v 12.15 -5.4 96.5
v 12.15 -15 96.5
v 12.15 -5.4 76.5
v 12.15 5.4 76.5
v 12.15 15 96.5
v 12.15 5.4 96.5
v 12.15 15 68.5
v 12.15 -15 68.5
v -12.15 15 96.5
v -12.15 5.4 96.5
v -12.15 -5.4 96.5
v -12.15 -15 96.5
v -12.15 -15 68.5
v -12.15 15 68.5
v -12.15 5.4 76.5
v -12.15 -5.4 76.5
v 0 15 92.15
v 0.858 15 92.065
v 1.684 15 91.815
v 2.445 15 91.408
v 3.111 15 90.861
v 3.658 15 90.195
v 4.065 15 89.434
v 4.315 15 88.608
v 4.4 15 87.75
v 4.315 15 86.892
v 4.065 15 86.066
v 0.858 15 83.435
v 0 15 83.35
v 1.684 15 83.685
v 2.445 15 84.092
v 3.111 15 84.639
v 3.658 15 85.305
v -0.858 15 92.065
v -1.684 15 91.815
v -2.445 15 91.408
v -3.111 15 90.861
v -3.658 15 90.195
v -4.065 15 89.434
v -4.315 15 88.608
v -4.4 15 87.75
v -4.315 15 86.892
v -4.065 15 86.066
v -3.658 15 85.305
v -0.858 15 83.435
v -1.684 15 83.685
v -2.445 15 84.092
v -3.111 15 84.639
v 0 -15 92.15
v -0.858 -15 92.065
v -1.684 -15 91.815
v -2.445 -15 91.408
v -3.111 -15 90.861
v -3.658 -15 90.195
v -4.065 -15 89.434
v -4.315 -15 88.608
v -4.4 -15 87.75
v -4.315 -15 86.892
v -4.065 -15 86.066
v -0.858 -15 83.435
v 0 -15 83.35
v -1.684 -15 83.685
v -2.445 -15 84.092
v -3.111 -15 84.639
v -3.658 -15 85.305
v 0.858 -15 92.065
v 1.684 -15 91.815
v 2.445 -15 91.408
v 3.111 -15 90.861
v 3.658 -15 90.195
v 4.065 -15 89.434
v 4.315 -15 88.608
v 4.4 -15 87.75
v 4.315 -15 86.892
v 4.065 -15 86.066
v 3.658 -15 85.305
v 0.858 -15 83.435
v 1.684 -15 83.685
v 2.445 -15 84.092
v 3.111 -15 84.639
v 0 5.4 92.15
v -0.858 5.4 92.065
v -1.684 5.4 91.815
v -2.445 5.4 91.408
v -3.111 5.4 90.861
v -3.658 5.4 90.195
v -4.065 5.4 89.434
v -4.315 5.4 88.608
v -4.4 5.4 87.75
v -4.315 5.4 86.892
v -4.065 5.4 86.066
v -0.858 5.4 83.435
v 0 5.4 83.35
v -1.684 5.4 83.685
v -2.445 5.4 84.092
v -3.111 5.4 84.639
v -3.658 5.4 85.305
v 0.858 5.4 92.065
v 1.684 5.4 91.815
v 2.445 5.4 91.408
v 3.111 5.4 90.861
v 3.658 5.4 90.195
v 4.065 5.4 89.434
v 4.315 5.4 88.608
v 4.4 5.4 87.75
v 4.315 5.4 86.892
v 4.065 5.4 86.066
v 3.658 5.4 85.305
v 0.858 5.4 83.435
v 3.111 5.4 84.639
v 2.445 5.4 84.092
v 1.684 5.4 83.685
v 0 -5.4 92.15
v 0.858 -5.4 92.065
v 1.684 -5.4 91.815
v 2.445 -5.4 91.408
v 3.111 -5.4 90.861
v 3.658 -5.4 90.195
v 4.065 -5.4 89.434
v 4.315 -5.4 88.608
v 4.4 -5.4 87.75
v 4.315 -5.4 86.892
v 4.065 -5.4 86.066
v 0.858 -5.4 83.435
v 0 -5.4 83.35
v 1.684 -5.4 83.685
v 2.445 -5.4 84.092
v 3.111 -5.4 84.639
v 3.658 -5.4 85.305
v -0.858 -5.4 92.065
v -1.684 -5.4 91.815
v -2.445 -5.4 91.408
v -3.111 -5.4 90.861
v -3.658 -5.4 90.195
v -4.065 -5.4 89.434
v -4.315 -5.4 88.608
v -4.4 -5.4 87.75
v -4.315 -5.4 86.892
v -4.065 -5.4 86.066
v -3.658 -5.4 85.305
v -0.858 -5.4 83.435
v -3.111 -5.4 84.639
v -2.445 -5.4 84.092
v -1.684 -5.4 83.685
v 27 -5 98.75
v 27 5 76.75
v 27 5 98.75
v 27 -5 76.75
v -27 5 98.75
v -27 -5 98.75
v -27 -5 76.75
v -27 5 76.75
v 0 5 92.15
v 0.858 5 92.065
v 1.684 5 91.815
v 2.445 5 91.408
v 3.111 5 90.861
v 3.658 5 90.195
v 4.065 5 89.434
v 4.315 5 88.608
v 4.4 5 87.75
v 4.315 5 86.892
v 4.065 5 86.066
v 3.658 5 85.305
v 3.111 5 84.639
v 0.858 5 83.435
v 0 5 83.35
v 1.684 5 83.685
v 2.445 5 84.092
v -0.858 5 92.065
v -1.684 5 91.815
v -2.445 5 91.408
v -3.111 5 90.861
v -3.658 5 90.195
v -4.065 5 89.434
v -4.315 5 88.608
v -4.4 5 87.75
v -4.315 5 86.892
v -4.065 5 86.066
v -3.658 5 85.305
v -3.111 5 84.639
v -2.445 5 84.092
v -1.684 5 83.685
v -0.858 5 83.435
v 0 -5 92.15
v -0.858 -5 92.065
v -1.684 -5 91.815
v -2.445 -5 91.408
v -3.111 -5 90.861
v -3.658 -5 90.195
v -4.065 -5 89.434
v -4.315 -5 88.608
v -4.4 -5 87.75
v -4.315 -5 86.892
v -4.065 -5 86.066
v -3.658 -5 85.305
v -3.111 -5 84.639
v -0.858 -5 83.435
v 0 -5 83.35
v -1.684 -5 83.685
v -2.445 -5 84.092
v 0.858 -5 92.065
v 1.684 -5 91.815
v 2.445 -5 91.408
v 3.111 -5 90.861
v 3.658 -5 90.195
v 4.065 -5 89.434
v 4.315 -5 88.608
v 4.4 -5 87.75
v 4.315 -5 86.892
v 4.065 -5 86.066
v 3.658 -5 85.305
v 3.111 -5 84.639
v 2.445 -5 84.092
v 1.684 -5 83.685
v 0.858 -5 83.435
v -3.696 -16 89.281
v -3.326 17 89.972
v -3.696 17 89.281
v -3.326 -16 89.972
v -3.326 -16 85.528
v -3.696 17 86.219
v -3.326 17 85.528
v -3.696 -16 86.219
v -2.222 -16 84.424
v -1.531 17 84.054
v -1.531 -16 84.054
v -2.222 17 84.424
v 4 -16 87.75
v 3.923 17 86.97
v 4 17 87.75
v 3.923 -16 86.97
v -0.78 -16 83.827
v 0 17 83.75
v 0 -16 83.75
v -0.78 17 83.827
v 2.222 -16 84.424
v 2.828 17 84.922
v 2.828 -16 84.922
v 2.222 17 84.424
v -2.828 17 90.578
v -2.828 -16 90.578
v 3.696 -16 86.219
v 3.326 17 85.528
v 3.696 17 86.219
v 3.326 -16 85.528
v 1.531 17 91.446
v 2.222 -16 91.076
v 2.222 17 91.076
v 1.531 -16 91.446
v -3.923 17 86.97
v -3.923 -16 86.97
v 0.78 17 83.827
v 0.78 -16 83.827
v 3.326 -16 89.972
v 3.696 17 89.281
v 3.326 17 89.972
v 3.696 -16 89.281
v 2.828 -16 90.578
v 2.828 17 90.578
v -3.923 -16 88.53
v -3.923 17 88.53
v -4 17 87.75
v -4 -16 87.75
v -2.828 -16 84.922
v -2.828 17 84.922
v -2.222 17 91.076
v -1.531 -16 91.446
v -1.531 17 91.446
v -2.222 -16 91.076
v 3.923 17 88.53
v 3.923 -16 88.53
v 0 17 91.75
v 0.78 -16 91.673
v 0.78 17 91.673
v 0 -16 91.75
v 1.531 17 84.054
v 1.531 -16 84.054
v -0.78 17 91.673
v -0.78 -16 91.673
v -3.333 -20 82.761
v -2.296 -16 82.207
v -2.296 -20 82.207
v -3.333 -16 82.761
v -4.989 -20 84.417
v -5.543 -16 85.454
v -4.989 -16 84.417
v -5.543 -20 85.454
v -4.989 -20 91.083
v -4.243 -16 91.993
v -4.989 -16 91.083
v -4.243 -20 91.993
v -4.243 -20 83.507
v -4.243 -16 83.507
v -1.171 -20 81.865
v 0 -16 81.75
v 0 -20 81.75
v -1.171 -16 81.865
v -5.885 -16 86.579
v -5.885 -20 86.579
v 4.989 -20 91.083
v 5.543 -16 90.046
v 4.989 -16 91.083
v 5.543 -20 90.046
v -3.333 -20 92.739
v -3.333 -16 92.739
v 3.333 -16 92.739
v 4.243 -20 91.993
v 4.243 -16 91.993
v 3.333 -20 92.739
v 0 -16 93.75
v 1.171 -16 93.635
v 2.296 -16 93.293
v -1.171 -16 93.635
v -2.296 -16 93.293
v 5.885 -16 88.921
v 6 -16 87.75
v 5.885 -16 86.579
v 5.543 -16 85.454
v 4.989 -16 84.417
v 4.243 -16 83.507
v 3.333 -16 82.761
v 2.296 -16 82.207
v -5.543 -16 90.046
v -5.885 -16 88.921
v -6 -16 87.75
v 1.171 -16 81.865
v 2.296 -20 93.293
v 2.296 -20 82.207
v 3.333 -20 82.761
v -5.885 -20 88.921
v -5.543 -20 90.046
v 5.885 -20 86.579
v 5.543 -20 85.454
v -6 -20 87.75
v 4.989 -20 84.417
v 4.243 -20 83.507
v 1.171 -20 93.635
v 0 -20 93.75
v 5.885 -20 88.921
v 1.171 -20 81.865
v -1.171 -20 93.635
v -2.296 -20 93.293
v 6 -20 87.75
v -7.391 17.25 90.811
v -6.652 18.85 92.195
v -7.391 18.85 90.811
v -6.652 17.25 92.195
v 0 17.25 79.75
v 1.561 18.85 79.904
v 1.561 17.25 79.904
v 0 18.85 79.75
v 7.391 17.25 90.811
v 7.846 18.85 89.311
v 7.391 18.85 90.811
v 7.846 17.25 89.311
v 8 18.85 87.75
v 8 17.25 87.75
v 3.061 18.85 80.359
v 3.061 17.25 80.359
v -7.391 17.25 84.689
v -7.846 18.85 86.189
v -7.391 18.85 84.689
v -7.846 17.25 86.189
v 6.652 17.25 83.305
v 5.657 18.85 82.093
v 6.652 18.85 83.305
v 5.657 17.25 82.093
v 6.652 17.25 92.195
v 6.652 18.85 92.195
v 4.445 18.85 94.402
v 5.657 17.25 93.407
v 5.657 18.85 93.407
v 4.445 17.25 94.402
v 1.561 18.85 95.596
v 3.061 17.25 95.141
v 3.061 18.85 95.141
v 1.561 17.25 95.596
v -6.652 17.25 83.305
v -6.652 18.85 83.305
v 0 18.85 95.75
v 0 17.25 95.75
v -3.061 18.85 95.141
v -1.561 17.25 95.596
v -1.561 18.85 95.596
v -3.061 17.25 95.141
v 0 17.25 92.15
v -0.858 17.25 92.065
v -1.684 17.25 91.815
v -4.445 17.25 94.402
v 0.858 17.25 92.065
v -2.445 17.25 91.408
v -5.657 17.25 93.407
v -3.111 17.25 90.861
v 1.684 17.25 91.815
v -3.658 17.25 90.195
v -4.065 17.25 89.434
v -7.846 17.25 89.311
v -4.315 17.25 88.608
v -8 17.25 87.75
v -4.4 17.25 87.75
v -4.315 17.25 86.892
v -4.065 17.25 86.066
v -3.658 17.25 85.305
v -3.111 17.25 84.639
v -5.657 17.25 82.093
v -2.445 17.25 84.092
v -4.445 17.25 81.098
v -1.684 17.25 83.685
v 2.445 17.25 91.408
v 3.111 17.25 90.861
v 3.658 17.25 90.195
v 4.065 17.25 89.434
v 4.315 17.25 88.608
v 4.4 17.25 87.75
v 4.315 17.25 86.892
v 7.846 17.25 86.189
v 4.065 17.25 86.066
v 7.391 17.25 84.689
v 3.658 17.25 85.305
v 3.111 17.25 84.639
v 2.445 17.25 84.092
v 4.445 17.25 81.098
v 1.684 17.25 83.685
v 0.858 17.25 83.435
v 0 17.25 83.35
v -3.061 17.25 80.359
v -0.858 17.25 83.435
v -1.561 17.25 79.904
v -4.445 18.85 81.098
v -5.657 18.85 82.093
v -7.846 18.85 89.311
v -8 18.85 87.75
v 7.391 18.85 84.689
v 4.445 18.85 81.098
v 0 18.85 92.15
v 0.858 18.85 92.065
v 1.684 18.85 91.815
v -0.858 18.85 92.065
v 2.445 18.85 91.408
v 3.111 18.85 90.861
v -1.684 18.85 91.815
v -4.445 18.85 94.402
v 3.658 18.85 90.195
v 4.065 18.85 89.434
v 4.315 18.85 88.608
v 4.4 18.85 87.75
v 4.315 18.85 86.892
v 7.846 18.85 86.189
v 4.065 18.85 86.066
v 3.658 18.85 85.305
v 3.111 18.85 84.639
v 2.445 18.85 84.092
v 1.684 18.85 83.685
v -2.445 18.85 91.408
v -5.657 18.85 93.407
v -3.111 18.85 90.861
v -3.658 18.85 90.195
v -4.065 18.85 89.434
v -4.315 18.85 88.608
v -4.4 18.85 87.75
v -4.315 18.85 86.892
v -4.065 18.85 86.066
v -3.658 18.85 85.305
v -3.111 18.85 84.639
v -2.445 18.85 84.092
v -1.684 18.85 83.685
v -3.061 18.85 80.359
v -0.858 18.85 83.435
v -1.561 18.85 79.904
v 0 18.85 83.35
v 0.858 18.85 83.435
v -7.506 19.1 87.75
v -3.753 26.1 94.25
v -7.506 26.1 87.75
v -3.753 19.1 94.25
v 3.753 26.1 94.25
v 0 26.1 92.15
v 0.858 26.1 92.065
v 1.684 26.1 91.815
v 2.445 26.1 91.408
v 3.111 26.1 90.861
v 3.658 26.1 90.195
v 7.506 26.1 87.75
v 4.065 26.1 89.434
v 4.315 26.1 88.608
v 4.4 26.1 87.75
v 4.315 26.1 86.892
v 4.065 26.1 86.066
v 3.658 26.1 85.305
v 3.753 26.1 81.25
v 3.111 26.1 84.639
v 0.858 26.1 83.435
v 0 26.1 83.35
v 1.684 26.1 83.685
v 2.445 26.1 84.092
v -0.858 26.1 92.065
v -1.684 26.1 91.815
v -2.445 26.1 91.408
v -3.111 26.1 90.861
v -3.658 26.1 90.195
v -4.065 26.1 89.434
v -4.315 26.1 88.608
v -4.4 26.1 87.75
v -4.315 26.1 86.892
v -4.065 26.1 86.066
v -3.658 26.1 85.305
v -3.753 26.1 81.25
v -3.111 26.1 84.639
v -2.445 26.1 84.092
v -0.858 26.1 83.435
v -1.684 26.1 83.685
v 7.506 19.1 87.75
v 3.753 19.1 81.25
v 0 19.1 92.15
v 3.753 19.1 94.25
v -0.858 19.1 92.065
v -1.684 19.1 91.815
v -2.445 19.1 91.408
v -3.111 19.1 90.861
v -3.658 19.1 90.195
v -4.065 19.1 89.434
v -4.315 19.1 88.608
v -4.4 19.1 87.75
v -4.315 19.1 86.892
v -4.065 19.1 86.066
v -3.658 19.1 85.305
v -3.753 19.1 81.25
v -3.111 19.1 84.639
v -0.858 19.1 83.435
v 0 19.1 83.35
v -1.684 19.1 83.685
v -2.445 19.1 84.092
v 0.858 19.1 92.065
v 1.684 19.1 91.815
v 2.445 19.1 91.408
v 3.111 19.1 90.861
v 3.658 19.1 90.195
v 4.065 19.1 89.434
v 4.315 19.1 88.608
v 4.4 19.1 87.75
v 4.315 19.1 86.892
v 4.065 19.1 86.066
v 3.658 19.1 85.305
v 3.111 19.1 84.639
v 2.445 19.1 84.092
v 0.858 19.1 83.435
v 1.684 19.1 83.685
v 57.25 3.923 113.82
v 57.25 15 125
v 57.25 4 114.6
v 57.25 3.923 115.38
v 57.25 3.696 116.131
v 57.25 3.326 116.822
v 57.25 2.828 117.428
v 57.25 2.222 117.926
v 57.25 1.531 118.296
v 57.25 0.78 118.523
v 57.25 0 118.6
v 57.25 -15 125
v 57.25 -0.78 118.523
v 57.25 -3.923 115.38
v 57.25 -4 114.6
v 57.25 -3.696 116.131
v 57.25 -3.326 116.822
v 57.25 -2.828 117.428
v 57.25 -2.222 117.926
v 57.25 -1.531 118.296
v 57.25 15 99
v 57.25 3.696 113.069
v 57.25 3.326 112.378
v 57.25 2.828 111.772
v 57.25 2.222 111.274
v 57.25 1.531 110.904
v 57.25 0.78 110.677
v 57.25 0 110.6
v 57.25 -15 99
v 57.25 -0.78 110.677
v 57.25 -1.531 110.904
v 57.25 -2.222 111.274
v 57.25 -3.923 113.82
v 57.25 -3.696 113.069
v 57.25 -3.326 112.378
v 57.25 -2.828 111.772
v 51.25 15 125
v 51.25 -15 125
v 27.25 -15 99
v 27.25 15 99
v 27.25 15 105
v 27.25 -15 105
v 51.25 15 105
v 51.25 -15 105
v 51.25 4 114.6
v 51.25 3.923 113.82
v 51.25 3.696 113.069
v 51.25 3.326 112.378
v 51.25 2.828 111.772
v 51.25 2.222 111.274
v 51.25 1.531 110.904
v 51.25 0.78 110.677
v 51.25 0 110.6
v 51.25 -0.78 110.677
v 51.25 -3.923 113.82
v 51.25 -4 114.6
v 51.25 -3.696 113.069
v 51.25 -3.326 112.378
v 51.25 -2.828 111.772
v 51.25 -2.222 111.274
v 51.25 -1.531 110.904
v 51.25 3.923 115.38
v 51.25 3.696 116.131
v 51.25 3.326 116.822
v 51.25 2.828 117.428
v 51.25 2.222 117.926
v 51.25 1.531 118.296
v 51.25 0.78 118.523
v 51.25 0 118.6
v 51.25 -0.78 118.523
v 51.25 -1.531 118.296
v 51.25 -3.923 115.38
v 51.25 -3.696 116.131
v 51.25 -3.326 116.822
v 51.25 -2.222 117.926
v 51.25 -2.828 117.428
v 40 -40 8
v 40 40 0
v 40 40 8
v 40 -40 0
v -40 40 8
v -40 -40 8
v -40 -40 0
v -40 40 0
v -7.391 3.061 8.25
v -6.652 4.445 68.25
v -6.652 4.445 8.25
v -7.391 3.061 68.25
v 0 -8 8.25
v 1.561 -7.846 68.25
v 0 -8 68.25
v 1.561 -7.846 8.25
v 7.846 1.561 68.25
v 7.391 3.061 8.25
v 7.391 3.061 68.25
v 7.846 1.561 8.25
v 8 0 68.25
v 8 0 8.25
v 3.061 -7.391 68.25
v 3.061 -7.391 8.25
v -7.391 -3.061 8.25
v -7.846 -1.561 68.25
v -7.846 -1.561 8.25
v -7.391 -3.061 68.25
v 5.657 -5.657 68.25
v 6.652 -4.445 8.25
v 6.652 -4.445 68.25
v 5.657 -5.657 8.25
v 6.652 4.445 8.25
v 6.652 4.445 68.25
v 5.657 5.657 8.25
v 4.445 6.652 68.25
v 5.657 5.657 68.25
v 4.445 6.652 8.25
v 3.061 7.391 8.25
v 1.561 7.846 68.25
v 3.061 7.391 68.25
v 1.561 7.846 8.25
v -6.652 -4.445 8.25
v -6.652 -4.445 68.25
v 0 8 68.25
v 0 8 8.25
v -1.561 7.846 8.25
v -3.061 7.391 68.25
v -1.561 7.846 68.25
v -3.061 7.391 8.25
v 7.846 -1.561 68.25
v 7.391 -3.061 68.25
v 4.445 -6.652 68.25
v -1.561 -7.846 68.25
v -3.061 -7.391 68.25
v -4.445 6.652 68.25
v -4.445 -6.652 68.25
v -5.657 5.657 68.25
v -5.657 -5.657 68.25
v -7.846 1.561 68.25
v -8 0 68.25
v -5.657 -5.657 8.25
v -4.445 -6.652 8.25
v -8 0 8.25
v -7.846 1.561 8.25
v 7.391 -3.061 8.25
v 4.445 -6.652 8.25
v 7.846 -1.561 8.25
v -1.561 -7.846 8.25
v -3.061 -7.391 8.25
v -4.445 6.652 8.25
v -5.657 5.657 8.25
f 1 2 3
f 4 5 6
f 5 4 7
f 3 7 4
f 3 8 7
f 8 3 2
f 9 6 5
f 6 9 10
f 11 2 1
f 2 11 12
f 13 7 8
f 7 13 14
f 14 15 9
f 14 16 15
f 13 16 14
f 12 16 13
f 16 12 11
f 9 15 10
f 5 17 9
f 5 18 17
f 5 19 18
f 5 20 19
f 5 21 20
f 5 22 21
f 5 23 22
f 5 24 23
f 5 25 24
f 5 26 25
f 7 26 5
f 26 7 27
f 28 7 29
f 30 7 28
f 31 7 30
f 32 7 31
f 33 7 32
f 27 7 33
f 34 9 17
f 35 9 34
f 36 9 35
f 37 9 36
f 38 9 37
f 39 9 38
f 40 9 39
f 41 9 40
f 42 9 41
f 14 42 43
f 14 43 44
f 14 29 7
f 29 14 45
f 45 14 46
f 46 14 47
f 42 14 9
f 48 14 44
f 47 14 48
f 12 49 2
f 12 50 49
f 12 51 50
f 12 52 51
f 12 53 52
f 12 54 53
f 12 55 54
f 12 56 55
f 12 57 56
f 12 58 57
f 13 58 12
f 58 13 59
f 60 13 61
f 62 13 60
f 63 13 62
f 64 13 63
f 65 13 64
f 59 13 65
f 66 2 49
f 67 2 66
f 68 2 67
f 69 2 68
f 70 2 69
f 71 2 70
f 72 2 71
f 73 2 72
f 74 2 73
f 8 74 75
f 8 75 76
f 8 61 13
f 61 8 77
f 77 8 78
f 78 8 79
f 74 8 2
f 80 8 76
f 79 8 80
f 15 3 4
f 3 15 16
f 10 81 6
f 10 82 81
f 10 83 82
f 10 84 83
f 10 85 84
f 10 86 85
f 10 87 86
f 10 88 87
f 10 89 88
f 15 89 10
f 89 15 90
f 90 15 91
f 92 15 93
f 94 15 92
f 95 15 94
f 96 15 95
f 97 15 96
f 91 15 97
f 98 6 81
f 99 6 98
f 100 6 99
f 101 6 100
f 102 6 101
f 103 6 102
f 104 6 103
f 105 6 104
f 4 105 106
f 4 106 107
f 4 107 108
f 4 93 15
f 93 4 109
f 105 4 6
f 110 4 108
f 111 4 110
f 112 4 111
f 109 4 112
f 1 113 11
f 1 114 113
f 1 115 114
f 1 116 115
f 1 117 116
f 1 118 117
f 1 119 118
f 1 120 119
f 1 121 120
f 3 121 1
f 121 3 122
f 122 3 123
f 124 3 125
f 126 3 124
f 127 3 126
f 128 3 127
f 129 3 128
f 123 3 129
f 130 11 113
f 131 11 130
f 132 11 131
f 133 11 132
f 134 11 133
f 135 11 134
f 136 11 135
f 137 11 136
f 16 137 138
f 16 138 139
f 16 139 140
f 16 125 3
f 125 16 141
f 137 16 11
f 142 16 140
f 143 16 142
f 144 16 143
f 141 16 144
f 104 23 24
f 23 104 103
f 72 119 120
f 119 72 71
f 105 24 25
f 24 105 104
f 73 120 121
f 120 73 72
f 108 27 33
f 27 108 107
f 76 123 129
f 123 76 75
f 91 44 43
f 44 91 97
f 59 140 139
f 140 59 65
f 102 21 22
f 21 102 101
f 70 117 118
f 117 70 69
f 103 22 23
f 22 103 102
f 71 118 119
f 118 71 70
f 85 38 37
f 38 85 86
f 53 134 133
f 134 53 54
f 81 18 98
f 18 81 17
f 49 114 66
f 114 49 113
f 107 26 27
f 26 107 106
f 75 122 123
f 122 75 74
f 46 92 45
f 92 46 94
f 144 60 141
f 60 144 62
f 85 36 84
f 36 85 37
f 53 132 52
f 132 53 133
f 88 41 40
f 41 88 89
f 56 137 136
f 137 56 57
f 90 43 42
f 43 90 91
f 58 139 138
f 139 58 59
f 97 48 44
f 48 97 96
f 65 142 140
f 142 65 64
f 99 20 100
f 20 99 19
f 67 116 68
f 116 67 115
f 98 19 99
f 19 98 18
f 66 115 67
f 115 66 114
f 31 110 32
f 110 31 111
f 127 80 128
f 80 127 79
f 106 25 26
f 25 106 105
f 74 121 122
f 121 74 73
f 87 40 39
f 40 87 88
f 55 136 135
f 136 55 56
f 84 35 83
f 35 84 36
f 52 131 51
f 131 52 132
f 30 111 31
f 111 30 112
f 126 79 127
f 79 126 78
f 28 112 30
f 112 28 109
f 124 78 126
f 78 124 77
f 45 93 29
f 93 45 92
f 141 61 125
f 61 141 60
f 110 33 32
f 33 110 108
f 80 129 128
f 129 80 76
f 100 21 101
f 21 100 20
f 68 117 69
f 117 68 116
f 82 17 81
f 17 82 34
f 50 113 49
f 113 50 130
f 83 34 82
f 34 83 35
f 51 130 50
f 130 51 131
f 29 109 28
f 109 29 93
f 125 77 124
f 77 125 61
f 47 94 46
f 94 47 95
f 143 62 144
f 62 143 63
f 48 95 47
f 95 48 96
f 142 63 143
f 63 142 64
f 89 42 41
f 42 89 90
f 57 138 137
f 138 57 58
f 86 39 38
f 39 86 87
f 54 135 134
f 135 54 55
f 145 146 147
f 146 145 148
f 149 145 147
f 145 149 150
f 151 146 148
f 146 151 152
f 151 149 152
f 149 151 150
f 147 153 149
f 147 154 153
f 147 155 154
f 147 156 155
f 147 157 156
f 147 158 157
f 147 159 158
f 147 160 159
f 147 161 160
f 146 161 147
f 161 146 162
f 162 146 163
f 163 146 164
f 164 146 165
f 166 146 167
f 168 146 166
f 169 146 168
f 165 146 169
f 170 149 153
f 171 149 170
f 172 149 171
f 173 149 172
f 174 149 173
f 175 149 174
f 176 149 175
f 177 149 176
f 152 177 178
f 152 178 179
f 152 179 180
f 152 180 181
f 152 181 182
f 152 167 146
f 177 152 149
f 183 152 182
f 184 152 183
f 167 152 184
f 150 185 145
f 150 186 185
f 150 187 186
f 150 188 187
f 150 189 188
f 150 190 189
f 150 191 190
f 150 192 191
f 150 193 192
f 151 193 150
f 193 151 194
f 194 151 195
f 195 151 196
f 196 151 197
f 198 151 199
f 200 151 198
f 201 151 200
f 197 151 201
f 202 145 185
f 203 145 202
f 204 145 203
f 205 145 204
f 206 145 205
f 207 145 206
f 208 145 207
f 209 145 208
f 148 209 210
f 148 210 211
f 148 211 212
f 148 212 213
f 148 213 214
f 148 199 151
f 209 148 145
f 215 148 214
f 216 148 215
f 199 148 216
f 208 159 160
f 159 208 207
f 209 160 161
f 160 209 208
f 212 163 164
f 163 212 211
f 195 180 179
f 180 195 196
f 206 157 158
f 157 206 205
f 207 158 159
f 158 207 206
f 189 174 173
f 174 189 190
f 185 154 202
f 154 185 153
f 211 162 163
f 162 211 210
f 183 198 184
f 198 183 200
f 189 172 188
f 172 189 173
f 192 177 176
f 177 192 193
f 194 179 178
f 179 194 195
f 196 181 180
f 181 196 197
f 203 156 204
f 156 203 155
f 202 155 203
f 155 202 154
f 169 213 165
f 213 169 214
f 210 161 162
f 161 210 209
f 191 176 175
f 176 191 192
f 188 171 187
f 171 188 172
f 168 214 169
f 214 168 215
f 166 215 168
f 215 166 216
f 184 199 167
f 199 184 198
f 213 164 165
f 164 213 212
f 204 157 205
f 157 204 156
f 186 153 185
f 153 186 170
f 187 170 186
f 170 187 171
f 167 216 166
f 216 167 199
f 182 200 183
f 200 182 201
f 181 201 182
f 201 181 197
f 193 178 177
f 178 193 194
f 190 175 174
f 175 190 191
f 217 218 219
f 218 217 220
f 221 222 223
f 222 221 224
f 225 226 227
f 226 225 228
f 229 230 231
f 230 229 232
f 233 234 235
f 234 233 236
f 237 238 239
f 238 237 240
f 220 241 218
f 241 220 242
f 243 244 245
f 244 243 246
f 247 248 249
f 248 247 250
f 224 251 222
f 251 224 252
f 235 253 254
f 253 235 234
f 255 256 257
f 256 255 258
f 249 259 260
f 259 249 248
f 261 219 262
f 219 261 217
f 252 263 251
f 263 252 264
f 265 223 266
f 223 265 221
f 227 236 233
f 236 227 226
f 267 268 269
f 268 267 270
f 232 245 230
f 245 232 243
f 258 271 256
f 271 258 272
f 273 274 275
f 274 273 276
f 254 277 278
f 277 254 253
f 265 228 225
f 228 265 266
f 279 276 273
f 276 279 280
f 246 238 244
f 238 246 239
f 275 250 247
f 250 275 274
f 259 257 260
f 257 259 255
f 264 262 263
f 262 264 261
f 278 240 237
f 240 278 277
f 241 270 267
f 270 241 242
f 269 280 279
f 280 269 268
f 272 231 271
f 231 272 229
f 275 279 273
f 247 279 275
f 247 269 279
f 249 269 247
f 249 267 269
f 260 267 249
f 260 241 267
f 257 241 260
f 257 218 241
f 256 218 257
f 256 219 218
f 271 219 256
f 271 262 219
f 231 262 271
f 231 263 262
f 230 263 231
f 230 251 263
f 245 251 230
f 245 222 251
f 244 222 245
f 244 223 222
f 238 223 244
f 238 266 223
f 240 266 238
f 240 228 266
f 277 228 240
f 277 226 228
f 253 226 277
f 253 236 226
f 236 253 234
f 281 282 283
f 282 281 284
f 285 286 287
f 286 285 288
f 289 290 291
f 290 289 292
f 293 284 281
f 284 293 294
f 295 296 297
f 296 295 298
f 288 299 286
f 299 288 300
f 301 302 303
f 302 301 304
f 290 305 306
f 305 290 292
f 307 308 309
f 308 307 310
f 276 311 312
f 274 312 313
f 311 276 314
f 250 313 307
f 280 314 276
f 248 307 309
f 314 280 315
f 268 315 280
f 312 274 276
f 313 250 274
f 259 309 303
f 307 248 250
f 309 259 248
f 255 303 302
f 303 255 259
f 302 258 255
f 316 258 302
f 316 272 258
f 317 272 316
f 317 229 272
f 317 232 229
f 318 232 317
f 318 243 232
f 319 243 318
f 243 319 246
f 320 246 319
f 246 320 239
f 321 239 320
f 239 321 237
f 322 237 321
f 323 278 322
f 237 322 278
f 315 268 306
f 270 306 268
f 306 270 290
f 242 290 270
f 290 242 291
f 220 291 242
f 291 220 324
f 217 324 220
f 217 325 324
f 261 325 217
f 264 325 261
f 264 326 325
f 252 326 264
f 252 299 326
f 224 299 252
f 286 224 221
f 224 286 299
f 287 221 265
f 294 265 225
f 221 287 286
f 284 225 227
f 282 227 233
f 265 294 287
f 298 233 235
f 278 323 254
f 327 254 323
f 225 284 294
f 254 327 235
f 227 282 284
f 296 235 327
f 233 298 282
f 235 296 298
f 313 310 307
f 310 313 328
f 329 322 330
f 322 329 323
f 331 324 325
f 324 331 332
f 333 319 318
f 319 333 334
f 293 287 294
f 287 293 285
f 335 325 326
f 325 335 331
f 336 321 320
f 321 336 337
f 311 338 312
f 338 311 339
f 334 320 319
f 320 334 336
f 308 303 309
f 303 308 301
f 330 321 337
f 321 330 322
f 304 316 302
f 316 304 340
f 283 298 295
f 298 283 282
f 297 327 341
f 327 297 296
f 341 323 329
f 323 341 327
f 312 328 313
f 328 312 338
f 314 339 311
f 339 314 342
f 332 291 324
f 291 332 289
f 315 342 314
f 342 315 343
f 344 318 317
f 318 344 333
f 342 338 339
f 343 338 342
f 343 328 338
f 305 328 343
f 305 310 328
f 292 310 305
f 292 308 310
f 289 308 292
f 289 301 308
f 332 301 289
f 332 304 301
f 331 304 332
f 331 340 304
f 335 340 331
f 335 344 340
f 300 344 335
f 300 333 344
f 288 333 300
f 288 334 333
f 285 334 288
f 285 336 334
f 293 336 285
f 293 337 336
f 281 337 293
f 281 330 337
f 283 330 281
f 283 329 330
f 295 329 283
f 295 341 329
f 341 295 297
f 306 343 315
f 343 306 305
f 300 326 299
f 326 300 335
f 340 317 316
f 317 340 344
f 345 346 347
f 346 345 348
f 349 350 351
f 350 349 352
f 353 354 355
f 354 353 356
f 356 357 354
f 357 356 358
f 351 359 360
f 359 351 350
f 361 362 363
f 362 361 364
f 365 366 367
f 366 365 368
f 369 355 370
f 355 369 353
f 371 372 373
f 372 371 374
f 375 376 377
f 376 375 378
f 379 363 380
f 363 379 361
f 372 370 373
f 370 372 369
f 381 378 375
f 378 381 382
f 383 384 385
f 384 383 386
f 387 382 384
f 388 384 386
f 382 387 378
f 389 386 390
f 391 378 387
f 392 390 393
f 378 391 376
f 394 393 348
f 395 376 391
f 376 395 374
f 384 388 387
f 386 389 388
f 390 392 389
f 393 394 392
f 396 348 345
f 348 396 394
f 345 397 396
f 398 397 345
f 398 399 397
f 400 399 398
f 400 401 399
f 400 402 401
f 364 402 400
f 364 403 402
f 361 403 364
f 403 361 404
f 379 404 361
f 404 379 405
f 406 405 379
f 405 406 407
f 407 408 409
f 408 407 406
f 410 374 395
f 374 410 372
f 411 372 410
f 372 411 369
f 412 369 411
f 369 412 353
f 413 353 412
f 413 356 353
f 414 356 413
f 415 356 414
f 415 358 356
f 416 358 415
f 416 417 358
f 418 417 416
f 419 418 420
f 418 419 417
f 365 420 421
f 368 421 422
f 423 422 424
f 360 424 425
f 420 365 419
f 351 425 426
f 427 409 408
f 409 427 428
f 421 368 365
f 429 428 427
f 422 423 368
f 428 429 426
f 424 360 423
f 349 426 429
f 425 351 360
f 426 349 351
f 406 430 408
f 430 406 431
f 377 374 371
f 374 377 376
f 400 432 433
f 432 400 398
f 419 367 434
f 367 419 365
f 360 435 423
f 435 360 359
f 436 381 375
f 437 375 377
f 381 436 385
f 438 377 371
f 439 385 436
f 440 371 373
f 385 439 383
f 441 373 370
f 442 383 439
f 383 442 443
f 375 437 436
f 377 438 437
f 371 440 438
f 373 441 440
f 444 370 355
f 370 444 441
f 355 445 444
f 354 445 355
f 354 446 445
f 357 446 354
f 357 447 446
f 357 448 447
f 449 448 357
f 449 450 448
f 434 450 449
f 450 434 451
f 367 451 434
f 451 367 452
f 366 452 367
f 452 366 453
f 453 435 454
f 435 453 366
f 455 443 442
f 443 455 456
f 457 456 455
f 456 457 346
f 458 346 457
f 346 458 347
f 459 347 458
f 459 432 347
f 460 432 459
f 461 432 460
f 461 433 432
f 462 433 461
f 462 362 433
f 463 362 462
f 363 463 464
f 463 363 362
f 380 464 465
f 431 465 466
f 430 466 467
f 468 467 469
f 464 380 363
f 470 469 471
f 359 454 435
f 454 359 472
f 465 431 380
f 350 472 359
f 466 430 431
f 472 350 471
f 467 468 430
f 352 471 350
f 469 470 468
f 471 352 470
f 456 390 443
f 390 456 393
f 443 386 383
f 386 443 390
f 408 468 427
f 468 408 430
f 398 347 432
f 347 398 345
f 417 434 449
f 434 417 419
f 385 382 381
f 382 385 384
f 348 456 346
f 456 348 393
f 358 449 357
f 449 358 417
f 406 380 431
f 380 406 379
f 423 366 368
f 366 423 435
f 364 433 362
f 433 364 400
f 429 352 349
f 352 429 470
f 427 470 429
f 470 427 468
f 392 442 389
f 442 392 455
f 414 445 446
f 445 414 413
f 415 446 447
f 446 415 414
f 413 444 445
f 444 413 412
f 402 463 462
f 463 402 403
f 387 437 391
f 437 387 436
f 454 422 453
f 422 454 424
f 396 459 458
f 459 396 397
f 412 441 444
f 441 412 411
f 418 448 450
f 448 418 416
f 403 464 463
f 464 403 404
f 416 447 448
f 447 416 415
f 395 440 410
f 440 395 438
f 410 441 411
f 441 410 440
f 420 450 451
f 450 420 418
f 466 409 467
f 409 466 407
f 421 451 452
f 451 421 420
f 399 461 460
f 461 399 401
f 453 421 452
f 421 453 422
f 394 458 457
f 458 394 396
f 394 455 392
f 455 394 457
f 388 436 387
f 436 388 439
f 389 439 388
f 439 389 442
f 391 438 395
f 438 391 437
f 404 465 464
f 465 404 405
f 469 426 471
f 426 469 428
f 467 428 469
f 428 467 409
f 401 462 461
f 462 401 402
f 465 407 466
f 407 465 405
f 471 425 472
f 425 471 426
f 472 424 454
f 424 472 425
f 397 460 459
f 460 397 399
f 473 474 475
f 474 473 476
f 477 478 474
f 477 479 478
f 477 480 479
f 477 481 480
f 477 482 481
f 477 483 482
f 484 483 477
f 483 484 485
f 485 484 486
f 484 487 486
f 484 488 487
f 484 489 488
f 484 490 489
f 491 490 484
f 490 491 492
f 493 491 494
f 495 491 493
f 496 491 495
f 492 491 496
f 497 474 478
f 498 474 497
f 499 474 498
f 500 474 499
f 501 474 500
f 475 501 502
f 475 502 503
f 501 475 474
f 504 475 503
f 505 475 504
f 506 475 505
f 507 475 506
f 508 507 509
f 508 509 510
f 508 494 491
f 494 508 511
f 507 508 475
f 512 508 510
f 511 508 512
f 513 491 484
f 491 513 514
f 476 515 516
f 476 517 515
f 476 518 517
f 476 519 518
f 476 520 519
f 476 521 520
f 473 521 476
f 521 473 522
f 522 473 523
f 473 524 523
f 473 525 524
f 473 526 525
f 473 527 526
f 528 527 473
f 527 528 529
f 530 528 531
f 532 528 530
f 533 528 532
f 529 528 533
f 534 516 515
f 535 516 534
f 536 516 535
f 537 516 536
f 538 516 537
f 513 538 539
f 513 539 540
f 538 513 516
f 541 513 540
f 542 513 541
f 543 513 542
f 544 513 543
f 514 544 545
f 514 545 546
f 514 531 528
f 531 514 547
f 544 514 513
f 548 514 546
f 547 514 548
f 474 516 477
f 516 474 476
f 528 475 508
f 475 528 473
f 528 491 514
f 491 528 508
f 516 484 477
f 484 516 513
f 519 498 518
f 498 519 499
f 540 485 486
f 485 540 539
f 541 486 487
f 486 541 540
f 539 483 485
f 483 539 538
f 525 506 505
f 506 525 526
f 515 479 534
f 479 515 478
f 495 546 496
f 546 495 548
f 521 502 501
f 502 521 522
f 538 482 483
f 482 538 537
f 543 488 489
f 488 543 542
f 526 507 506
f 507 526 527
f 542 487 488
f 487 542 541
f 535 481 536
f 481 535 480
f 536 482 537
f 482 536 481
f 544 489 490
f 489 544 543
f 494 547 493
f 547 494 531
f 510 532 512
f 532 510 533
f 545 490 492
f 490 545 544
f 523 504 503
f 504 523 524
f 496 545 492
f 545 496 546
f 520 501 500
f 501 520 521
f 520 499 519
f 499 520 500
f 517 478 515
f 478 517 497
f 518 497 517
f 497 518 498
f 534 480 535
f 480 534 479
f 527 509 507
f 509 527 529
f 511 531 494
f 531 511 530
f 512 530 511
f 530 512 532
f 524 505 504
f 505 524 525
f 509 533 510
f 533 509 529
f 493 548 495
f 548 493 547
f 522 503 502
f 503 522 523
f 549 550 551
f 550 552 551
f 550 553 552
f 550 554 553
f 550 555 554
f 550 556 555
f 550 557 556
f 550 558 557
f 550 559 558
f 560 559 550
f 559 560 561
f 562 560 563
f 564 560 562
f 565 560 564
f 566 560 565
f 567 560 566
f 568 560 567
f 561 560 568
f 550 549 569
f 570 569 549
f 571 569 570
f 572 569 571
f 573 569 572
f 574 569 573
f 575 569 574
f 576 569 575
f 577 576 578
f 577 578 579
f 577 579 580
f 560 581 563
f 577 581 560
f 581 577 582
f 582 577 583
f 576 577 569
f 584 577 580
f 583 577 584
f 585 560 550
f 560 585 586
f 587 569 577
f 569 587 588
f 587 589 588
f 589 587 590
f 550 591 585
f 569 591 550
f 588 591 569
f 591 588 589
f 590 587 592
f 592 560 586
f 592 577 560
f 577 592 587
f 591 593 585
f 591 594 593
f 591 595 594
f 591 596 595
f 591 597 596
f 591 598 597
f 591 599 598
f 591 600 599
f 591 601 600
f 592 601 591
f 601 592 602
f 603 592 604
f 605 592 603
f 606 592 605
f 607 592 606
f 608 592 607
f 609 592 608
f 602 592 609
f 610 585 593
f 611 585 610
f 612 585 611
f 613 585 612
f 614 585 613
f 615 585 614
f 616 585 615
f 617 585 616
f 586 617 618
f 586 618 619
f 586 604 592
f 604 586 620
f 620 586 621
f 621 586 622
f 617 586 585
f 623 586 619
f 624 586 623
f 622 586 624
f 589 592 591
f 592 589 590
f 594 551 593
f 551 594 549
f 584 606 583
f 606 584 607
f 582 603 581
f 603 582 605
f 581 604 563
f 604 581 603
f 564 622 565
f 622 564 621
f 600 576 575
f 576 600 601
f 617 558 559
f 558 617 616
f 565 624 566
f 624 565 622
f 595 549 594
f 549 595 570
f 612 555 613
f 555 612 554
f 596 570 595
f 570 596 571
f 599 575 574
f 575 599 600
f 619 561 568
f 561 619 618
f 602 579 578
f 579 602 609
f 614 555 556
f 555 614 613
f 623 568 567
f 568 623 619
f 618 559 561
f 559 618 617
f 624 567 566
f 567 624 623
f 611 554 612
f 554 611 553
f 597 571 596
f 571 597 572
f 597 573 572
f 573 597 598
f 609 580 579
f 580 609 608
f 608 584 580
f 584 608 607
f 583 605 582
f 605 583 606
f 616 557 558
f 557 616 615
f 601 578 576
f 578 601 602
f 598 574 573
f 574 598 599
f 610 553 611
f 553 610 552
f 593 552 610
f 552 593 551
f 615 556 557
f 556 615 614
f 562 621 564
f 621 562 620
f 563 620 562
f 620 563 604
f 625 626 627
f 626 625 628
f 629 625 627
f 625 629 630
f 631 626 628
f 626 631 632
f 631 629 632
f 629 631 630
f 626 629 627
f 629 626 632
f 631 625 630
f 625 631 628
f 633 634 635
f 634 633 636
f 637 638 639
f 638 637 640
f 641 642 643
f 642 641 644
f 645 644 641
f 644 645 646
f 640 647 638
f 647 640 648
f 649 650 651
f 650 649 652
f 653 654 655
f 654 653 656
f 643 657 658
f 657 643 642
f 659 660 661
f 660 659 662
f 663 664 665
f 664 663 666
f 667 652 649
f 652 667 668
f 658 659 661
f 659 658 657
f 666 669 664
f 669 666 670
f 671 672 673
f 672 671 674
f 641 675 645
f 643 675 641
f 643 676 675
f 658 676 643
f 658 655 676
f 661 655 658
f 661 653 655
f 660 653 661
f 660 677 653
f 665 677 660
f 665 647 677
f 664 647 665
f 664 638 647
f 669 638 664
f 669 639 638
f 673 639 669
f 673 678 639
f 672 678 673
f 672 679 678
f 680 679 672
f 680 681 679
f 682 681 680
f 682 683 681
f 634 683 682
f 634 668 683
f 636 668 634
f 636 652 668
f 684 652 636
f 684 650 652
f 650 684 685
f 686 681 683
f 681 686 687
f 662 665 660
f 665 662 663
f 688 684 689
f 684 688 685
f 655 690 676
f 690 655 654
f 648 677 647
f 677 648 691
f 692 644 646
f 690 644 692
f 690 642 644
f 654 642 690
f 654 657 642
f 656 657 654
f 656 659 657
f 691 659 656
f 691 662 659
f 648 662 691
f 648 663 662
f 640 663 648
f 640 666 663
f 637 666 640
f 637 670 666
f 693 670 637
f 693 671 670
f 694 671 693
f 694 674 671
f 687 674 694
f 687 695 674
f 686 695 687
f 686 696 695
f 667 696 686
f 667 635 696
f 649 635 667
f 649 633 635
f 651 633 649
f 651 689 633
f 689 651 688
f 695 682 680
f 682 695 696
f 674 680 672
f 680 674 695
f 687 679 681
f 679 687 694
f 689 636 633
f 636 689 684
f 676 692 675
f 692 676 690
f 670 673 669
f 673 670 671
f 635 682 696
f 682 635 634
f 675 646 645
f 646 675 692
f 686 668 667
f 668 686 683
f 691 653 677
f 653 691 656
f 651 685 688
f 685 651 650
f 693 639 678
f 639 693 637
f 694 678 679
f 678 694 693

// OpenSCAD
$fn = 32;

// ------------------------------------------------------------------------
// Lamp arm: column d16 x 60 mm, arm 54 mm
// Every part is its own module, assembly() places every instance.
// ------------------------------------------------------------------------

// --- part 1 ---
module lamp_base() {
  difference() {
    translate([-40, -40, 0]) cube([80, 80, 8]);
  }
}

// --- part 2 ---
module lamp_column() {
  cylinder(h = 60, d = 16);
}

// --- part 3 ---
module head_fork() {
  difference() {
    translate([-12.15, -15, 0]) cube([24.3, 30, 28]);
    translate([-13.15, -5.4, 8]) cube([26.3, 10.8, 21]);
    translate([0, 0, 19.25]) rotate([90, 0, 0]) cylinder(h = 32, d = 8.8, center = true);
  }
}

// --- part 4 ---
module lamp_arm() {
  difference() {
    translate([-27, -5, 0]) cube([54, 10, 22]);
    translate([0, 0, 11]) rotate([90, 0, 0]) cylinder(h = 12, d = 8.8, center = true);
  }
}

// --- part 5 ---
module arm_pin() {
  rotate([0, 90, 0]) cylinder(h = 34, d = 8, center = true);
  translate([-20, 0, 0]) rotate([0, 90, 0]) cylinder(h = 4, d = 12);
}

// --- part 6 ---
module arm_washer() {
  difference() {
      translate([0, 0, 0]) cylinder(h = 1.6, d = 16);
      translate([0, 0, -1]) cylinder(h = 3.6, d = 8.8);
    }
}

// --- part 7 ---
module arm_nut() {
  difference() {
    linear_extrude(height = 7) polygon(points = [[7.506, 0], [3.753, 6.5], [-3.753, 6.5], [-7.506, 0], [-3.753, -6.5], [3.753, -6.5]]);
    translate([0, 0, -1]) cylinder(h = 9, d = 8.8);
  }
}

// --- part 8 ---
module shade_bracket() {
  difference() {
    translate([-15, -15, 0]) cube([30, 30, 26]);
    translate([-16, -16, 6]) cube([25, 32, 21]);
    translate([12, 0, 15.6]) rotate([0, 90, 0]) cylinder(h = 8, d = 8, center = true);
  }
}

// --- assembly ---
module assembly() {
  color([0.80, 0.24, 0.20]) translate([0, 0, 0]) rotate([0, 0, 0]) lamp_base();
  color([0.20, 0.45, 0.75]) translate([0, 0, 8.25]) rotate([0, 0, 0]) lamp_column();
  color([0.25, 0.62, 0.32]) translate([0, 0, 68.5]) rotate([0, 0, 0]) head_fork();
  color([0.92, 0.70, 0.18]) translate([0, 0, 76.75]) rotate([0, 0, 0]) lamp_arm();
  color([0.58, 0.35, 0.70]) translate([0, 0, 87.75]) rotate([0, 0, 90]) arm_pin();
  color([0.16, 0.66, 0.66]) translate([0, 18.85, 87.75]) rotate([90, 0, 0]) arm_washer();
  color([0.85, 0.48, 0.18]) translate([0, 26.1, 87.75]) rotate([90, 0, 0]) arm_nut();
  color([0.55, 0.60, 0.65]) translate([42.25, 0, 99]) rotate([0, 0, 0]) shade_bracket();
}

assembly();
